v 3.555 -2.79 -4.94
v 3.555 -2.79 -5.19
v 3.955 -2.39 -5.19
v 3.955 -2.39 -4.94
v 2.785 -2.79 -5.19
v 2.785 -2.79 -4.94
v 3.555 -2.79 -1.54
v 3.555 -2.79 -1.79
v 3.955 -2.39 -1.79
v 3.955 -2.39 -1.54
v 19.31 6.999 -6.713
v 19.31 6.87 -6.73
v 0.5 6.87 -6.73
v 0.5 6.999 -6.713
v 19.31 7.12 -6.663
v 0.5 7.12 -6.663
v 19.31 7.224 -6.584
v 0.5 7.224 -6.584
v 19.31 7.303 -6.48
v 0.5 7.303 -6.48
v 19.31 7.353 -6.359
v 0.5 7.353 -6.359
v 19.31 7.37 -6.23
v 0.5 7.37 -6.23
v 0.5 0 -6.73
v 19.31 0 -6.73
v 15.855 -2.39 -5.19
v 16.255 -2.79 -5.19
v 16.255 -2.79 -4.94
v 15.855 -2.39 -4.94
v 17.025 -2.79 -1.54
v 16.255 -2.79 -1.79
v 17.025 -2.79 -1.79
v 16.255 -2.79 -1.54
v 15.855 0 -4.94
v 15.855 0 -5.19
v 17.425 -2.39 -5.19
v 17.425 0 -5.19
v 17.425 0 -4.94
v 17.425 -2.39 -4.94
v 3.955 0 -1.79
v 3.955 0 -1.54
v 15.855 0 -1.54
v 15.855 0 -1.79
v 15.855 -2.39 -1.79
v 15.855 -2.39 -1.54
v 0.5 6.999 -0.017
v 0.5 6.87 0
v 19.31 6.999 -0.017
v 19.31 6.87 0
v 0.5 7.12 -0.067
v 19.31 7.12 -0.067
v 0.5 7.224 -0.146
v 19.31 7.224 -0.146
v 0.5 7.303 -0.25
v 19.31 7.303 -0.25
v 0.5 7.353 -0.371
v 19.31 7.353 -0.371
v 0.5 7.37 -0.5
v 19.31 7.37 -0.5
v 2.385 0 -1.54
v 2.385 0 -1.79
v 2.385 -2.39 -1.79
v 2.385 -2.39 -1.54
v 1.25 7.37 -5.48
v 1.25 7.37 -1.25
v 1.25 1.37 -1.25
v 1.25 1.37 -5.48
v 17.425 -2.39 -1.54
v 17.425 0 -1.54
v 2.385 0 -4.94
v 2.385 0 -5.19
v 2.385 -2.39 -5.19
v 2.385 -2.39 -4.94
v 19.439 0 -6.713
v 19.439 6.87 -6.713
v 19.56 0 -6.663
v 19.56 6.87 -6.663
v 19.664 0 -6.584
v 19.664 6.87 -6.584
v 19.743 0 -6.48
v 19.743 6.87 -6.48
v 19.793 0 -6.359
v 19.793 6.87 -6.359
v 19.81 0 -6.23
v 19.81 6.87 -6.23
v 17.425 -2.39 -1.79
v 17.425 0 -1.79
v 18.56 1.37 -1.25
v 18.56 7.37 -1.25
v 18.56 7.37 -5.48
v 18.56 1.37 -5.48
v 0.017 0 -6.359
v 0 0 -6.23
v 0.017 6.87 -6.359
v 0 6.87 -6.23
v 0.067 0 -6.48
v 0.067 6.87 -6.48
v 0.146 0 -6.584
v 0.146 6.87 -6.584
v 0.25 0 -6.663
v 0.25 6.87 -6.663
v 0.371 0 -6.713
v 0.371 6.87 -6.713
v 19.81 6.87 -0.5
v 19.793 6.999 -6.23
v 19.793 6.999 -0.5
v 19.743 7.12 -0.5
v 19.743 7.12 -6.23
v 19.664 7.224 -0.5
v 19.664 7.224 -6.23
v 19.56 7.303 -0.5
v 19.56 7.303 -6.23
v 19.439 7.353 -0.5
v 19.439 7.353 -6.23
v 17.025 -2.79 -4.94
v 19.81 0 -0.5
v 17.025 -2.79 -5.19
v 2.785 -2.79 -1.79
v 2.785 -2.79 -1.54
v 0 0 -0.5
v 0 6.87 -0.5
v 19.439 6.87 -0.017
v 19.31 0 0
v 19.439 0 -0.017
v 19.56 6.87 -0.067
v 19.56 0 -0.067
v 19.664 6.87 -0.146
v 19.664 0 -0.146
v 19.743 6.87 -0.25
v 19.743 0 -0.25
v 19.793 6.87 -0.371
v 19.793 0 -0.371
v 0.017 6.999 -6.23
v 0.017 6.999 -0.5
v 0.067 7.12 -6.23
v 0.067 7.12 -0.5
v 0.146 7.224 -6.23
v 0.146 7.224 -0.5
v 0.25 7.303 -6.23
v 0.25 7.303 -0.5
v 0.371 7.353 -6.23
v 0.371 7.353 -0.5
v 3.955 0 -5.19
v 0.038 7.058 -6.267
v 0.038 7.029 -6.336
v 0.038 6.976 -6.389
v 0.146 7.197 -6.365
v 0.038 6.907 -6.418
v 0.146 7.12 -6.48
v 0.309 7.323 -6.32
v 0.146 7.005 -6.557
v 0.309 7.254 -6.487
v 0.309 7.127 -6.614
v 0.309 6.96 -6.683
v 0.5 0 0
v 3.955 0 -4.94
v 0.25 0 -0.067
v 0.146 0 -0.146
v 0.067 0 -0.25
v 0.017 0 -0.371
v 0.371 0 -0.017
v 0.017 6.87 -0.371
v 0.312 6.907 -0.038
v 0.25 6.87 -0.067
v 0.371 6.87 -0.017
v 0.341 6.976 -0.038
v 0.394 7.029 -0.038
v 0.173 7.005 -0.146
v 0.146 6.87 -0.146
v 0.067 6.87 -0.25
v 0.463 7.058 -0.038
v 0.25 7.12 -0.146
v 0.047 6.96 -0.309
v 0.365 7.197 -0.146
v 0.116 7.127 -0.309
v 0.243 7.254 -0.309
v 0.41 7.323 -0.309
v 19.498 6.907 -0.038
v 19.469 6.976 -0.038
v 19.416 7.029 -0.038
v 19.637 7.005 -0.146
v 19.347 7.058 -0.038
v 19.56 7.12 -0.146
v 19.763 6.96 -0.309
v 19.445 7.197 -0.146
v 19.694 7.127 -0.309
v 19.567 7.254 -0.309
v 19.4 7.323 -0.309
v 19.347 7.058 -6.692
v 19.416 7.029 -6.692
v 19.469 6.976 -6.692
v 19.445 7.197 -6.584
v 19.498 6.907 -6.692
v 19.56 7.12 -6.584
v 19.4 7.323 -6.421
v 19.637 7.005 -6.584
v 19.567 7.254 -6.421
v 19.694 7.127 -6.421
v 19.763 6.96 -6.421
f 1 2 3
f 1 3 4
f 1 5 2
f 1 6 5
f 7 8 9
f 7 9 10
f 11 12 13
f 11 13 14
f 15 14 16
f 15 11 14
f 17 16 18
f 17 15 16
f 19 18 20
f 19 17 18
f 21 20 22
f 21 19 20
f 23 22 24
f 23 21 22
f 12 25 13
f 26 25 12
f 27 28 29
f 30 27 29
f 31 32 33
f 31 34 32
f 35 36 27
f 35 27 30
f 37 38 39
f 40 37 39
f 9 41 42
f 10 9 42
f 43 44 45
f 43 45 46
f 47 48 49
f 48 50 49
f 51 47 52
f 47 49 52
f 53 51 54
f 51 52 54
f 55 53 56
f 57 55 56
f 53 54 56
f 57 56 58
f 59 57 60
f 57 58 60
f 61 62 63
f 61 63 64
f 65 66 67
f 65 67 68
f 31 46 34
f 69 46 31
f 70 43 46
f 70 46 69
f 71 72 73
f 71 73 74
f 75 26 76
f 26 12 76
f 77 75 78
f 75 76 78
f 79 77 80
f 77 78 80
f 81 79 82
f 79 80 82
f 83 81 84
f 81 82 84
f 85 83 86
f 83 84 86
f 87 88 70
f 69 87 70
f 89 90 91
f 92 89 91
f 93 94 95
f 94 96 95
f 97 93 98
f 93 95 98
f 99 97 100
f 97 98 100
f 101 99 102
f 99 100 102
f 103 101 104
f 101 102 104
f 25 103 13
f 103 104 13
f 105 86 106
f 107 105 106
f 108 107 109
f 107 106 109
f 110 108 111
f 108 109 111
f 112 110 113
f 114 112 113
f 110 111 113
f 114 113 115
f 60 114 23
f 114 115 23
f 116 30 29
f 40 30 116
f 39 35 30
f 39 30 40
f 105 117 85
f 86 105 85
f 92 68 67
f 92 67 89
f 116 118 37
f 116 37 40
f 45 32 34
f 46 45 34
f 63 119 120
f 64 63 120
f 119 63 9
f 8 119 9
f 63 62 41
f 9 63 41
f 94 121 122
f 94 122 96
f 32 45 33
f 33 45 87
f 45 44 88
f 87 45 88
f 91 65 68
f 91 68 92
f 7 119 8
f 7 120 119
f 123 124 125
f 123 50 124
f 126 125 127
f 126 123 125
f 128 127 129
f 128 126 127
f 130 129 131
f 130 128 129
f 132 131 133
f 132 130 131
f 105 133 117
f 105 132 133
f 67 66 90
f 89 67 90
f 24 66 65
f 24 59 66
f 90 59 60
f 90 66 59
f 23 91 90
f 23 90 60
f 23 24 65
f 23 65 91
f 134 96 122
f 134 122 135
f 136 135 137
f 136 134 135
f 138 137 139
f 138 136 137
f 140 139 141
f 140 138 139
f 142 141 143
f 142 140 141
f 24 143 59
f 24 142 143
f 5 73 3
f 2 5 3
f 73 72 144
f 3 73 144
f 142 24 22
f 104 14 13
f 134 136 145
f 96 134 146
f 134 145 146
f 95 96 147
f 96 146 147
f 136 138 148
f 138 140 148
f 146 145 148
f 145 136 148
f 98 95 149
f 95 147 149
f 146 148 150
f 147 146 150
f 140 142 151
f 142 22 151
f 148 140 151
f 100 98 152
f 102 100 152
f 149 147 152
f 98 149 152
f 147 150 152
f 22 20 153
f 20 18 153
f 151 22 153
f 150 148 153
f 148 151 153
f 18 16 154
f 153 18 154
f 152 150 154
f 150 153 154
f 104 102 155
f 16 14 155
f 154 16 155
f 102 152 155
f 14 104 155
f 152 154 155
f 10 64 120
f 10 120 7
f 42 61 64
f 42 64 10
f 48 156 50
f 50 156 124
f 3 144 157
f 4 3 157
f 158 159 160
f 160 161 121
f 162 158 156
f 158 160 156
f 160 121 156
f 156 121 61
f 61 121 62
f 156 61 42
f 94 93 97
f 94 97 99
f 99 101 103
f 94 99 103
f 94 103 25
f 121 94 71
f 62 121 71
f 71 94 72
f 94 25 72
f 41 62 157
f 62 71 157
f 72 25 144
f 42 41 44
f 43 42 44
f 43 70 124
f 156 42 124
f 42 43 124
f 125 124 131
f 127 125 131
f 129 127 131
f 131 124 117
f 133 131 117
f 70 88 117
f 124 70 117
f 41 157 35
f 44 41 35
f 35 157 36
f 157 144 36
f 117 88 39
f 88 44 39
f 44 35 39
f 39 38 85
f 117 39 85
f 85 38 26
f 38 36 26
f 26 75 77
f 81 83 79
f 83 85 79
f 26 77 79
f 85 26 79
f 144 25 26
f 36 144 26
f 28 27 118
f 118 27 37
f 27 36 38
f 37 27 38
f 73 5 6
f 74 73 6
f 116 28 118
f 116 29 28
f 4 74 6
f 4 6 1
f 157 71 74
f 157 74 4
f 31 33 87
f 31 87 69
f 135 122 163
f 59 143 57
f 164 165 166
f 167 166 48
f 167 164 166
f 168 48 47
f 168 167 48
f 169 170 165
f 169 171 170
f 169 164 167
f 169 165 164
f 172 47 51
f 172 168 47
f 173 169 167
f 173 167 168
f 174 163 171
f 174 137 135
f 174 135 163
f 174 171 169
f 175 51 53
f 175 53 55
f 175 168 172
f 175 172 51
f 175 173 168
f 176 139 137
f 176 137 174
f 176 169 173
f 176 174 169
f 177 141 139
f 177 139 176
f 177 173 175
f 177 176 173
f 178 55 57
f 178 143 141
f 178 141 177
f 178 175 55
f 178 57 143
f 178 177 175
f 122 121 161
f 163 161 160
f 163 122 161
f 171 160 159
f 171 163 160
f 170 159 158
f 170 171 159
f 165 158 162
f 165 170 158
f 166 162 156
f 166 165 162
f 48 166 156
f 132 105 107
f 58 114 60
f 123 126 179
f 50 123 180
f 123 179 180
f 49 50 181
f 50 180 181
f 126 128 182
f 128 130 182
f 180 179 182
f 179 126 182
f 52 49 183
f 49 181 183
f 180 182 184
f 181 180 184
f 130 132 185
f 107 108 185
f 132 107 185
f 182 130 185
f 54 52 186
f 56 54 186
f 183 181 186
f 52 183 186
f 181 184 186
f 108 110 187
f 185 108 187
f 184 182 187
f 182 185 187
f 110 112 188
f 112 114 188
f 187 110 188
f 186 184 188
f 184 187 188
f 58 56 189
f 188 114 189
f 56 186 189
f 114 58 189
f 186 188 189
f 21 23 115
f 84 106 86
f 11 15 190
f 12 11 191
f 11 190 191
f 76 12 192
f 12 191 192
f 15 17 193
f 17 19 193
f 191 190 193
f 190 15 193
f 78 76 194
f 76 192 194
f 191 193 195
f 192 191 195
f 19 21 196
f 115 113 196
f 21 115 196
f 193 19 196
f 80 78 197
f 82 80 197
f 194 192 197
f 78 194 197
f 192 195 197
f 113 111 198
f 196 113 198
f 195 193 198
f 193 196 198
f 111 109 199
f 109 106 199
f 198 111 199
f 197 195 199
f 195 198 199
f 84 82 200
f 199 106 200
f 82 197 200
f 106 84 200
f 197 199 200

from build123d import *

# Parameters (mm, degrees)
SKETCH1_W           = 19.81
SKETCH1_H           = 6.73
BOSS_EXTRUDE1_DEPTH = 7.37
SKETCH2_W           = 1.57
SKETCH2_H           = 0.25
BOSS_EXTRUDE2_DEPTH = 2.79
CHAMFER1_SIZE       = 0.4
SKETCH3_W           = 17.31
SKETCH3_H           = 4.23
CUT_EXTRUDE1_DEPTH  = 6
FILLET1_R           = 0.5


with BuildPart() as part:
    # Sketch1 → Boss-Extrude1 (new body)
    with BuildSketch(Plane(origin=(0, 0, 0), x_dir=(1, 0, 0), z_dir=(0, 1, 0))):
        with Locations((9.905, 3.365)):
            Rectangle(SKETCH1_W, SKETCH1_H)
    extrude(amount=BOSS_EXTRUDE1_DEPTH)

    # Sketch2 → Boss-Extrude2 (add)
    with BuildSketch(Plane.XZ):
        with Locations((3.17, -5.065)):
            Rectangle(SKETCH2_W, SKETCH2_H)
        with Locations((3.17, -1.665)):
            Rectangle(SKETCH2_W, SKETCH2_H)
        with Locations((16.64, -1.665)):
            Rectangle(SKETCH2_W, SKETCH2_H)
        with Locations((16.64, -5.065)):
            Rectangle(SKETCH2_W, SKETCH2_H)
    extrude(amount=BOSS_EXTRUDE2_DEPTH)

    # Chamfer1
    chamfer1_edges = [part.edges().sort_by_distance(p)[0] for p in [
        (3.955, -2.79, -5.065),
        (2.385, -2.79, -5.065),
        (3.955, -2.79, -1.665),
        (2.385, -2.79, -1.665),
        (17.425, -2.79, -1.665),
        (15.855, -2.79, -1.665),
        (17.425, -2.79, -5.065),
        (15.855, -2.79, -5.065),
    ]]
    chamfer(chamfer1_edges, length=CHAMFER1_SIZE)

    # Sketch3 → Cut-Extrude1 (cut)
    with BuildSketch(Plane(origin=(0, 7.37, 0), x_dir=(1, 0, 0), z_dir=(0, 1, 0))):
        with Locations((9.905, 3.365)):
            Rectangle(SKETCH3_W, SKETCH3_H)
    extrude(amount=-CUT_EXTRUDE1_DEPTH, mode=Mode.SUBTRACT)

    # Fillet1
    fillet1_edges = [part.edges().sort_by_distance(p)[0] for p in [
        (19.81, 7.37, -3.365),
        (9.905, 7.37, -6.73),
        (0, 7.37, -3.365),
        (0, 3.685, -6.73),
        (19.81, 3.685, -6.73),
        (19.81, 3.685, 0),
        (0, 3.685, 0),
        (9.905, 7.37, 0),
    ]]
    fillet(fillet1_edges, radius=FILLET1_R)


solid = part.part
